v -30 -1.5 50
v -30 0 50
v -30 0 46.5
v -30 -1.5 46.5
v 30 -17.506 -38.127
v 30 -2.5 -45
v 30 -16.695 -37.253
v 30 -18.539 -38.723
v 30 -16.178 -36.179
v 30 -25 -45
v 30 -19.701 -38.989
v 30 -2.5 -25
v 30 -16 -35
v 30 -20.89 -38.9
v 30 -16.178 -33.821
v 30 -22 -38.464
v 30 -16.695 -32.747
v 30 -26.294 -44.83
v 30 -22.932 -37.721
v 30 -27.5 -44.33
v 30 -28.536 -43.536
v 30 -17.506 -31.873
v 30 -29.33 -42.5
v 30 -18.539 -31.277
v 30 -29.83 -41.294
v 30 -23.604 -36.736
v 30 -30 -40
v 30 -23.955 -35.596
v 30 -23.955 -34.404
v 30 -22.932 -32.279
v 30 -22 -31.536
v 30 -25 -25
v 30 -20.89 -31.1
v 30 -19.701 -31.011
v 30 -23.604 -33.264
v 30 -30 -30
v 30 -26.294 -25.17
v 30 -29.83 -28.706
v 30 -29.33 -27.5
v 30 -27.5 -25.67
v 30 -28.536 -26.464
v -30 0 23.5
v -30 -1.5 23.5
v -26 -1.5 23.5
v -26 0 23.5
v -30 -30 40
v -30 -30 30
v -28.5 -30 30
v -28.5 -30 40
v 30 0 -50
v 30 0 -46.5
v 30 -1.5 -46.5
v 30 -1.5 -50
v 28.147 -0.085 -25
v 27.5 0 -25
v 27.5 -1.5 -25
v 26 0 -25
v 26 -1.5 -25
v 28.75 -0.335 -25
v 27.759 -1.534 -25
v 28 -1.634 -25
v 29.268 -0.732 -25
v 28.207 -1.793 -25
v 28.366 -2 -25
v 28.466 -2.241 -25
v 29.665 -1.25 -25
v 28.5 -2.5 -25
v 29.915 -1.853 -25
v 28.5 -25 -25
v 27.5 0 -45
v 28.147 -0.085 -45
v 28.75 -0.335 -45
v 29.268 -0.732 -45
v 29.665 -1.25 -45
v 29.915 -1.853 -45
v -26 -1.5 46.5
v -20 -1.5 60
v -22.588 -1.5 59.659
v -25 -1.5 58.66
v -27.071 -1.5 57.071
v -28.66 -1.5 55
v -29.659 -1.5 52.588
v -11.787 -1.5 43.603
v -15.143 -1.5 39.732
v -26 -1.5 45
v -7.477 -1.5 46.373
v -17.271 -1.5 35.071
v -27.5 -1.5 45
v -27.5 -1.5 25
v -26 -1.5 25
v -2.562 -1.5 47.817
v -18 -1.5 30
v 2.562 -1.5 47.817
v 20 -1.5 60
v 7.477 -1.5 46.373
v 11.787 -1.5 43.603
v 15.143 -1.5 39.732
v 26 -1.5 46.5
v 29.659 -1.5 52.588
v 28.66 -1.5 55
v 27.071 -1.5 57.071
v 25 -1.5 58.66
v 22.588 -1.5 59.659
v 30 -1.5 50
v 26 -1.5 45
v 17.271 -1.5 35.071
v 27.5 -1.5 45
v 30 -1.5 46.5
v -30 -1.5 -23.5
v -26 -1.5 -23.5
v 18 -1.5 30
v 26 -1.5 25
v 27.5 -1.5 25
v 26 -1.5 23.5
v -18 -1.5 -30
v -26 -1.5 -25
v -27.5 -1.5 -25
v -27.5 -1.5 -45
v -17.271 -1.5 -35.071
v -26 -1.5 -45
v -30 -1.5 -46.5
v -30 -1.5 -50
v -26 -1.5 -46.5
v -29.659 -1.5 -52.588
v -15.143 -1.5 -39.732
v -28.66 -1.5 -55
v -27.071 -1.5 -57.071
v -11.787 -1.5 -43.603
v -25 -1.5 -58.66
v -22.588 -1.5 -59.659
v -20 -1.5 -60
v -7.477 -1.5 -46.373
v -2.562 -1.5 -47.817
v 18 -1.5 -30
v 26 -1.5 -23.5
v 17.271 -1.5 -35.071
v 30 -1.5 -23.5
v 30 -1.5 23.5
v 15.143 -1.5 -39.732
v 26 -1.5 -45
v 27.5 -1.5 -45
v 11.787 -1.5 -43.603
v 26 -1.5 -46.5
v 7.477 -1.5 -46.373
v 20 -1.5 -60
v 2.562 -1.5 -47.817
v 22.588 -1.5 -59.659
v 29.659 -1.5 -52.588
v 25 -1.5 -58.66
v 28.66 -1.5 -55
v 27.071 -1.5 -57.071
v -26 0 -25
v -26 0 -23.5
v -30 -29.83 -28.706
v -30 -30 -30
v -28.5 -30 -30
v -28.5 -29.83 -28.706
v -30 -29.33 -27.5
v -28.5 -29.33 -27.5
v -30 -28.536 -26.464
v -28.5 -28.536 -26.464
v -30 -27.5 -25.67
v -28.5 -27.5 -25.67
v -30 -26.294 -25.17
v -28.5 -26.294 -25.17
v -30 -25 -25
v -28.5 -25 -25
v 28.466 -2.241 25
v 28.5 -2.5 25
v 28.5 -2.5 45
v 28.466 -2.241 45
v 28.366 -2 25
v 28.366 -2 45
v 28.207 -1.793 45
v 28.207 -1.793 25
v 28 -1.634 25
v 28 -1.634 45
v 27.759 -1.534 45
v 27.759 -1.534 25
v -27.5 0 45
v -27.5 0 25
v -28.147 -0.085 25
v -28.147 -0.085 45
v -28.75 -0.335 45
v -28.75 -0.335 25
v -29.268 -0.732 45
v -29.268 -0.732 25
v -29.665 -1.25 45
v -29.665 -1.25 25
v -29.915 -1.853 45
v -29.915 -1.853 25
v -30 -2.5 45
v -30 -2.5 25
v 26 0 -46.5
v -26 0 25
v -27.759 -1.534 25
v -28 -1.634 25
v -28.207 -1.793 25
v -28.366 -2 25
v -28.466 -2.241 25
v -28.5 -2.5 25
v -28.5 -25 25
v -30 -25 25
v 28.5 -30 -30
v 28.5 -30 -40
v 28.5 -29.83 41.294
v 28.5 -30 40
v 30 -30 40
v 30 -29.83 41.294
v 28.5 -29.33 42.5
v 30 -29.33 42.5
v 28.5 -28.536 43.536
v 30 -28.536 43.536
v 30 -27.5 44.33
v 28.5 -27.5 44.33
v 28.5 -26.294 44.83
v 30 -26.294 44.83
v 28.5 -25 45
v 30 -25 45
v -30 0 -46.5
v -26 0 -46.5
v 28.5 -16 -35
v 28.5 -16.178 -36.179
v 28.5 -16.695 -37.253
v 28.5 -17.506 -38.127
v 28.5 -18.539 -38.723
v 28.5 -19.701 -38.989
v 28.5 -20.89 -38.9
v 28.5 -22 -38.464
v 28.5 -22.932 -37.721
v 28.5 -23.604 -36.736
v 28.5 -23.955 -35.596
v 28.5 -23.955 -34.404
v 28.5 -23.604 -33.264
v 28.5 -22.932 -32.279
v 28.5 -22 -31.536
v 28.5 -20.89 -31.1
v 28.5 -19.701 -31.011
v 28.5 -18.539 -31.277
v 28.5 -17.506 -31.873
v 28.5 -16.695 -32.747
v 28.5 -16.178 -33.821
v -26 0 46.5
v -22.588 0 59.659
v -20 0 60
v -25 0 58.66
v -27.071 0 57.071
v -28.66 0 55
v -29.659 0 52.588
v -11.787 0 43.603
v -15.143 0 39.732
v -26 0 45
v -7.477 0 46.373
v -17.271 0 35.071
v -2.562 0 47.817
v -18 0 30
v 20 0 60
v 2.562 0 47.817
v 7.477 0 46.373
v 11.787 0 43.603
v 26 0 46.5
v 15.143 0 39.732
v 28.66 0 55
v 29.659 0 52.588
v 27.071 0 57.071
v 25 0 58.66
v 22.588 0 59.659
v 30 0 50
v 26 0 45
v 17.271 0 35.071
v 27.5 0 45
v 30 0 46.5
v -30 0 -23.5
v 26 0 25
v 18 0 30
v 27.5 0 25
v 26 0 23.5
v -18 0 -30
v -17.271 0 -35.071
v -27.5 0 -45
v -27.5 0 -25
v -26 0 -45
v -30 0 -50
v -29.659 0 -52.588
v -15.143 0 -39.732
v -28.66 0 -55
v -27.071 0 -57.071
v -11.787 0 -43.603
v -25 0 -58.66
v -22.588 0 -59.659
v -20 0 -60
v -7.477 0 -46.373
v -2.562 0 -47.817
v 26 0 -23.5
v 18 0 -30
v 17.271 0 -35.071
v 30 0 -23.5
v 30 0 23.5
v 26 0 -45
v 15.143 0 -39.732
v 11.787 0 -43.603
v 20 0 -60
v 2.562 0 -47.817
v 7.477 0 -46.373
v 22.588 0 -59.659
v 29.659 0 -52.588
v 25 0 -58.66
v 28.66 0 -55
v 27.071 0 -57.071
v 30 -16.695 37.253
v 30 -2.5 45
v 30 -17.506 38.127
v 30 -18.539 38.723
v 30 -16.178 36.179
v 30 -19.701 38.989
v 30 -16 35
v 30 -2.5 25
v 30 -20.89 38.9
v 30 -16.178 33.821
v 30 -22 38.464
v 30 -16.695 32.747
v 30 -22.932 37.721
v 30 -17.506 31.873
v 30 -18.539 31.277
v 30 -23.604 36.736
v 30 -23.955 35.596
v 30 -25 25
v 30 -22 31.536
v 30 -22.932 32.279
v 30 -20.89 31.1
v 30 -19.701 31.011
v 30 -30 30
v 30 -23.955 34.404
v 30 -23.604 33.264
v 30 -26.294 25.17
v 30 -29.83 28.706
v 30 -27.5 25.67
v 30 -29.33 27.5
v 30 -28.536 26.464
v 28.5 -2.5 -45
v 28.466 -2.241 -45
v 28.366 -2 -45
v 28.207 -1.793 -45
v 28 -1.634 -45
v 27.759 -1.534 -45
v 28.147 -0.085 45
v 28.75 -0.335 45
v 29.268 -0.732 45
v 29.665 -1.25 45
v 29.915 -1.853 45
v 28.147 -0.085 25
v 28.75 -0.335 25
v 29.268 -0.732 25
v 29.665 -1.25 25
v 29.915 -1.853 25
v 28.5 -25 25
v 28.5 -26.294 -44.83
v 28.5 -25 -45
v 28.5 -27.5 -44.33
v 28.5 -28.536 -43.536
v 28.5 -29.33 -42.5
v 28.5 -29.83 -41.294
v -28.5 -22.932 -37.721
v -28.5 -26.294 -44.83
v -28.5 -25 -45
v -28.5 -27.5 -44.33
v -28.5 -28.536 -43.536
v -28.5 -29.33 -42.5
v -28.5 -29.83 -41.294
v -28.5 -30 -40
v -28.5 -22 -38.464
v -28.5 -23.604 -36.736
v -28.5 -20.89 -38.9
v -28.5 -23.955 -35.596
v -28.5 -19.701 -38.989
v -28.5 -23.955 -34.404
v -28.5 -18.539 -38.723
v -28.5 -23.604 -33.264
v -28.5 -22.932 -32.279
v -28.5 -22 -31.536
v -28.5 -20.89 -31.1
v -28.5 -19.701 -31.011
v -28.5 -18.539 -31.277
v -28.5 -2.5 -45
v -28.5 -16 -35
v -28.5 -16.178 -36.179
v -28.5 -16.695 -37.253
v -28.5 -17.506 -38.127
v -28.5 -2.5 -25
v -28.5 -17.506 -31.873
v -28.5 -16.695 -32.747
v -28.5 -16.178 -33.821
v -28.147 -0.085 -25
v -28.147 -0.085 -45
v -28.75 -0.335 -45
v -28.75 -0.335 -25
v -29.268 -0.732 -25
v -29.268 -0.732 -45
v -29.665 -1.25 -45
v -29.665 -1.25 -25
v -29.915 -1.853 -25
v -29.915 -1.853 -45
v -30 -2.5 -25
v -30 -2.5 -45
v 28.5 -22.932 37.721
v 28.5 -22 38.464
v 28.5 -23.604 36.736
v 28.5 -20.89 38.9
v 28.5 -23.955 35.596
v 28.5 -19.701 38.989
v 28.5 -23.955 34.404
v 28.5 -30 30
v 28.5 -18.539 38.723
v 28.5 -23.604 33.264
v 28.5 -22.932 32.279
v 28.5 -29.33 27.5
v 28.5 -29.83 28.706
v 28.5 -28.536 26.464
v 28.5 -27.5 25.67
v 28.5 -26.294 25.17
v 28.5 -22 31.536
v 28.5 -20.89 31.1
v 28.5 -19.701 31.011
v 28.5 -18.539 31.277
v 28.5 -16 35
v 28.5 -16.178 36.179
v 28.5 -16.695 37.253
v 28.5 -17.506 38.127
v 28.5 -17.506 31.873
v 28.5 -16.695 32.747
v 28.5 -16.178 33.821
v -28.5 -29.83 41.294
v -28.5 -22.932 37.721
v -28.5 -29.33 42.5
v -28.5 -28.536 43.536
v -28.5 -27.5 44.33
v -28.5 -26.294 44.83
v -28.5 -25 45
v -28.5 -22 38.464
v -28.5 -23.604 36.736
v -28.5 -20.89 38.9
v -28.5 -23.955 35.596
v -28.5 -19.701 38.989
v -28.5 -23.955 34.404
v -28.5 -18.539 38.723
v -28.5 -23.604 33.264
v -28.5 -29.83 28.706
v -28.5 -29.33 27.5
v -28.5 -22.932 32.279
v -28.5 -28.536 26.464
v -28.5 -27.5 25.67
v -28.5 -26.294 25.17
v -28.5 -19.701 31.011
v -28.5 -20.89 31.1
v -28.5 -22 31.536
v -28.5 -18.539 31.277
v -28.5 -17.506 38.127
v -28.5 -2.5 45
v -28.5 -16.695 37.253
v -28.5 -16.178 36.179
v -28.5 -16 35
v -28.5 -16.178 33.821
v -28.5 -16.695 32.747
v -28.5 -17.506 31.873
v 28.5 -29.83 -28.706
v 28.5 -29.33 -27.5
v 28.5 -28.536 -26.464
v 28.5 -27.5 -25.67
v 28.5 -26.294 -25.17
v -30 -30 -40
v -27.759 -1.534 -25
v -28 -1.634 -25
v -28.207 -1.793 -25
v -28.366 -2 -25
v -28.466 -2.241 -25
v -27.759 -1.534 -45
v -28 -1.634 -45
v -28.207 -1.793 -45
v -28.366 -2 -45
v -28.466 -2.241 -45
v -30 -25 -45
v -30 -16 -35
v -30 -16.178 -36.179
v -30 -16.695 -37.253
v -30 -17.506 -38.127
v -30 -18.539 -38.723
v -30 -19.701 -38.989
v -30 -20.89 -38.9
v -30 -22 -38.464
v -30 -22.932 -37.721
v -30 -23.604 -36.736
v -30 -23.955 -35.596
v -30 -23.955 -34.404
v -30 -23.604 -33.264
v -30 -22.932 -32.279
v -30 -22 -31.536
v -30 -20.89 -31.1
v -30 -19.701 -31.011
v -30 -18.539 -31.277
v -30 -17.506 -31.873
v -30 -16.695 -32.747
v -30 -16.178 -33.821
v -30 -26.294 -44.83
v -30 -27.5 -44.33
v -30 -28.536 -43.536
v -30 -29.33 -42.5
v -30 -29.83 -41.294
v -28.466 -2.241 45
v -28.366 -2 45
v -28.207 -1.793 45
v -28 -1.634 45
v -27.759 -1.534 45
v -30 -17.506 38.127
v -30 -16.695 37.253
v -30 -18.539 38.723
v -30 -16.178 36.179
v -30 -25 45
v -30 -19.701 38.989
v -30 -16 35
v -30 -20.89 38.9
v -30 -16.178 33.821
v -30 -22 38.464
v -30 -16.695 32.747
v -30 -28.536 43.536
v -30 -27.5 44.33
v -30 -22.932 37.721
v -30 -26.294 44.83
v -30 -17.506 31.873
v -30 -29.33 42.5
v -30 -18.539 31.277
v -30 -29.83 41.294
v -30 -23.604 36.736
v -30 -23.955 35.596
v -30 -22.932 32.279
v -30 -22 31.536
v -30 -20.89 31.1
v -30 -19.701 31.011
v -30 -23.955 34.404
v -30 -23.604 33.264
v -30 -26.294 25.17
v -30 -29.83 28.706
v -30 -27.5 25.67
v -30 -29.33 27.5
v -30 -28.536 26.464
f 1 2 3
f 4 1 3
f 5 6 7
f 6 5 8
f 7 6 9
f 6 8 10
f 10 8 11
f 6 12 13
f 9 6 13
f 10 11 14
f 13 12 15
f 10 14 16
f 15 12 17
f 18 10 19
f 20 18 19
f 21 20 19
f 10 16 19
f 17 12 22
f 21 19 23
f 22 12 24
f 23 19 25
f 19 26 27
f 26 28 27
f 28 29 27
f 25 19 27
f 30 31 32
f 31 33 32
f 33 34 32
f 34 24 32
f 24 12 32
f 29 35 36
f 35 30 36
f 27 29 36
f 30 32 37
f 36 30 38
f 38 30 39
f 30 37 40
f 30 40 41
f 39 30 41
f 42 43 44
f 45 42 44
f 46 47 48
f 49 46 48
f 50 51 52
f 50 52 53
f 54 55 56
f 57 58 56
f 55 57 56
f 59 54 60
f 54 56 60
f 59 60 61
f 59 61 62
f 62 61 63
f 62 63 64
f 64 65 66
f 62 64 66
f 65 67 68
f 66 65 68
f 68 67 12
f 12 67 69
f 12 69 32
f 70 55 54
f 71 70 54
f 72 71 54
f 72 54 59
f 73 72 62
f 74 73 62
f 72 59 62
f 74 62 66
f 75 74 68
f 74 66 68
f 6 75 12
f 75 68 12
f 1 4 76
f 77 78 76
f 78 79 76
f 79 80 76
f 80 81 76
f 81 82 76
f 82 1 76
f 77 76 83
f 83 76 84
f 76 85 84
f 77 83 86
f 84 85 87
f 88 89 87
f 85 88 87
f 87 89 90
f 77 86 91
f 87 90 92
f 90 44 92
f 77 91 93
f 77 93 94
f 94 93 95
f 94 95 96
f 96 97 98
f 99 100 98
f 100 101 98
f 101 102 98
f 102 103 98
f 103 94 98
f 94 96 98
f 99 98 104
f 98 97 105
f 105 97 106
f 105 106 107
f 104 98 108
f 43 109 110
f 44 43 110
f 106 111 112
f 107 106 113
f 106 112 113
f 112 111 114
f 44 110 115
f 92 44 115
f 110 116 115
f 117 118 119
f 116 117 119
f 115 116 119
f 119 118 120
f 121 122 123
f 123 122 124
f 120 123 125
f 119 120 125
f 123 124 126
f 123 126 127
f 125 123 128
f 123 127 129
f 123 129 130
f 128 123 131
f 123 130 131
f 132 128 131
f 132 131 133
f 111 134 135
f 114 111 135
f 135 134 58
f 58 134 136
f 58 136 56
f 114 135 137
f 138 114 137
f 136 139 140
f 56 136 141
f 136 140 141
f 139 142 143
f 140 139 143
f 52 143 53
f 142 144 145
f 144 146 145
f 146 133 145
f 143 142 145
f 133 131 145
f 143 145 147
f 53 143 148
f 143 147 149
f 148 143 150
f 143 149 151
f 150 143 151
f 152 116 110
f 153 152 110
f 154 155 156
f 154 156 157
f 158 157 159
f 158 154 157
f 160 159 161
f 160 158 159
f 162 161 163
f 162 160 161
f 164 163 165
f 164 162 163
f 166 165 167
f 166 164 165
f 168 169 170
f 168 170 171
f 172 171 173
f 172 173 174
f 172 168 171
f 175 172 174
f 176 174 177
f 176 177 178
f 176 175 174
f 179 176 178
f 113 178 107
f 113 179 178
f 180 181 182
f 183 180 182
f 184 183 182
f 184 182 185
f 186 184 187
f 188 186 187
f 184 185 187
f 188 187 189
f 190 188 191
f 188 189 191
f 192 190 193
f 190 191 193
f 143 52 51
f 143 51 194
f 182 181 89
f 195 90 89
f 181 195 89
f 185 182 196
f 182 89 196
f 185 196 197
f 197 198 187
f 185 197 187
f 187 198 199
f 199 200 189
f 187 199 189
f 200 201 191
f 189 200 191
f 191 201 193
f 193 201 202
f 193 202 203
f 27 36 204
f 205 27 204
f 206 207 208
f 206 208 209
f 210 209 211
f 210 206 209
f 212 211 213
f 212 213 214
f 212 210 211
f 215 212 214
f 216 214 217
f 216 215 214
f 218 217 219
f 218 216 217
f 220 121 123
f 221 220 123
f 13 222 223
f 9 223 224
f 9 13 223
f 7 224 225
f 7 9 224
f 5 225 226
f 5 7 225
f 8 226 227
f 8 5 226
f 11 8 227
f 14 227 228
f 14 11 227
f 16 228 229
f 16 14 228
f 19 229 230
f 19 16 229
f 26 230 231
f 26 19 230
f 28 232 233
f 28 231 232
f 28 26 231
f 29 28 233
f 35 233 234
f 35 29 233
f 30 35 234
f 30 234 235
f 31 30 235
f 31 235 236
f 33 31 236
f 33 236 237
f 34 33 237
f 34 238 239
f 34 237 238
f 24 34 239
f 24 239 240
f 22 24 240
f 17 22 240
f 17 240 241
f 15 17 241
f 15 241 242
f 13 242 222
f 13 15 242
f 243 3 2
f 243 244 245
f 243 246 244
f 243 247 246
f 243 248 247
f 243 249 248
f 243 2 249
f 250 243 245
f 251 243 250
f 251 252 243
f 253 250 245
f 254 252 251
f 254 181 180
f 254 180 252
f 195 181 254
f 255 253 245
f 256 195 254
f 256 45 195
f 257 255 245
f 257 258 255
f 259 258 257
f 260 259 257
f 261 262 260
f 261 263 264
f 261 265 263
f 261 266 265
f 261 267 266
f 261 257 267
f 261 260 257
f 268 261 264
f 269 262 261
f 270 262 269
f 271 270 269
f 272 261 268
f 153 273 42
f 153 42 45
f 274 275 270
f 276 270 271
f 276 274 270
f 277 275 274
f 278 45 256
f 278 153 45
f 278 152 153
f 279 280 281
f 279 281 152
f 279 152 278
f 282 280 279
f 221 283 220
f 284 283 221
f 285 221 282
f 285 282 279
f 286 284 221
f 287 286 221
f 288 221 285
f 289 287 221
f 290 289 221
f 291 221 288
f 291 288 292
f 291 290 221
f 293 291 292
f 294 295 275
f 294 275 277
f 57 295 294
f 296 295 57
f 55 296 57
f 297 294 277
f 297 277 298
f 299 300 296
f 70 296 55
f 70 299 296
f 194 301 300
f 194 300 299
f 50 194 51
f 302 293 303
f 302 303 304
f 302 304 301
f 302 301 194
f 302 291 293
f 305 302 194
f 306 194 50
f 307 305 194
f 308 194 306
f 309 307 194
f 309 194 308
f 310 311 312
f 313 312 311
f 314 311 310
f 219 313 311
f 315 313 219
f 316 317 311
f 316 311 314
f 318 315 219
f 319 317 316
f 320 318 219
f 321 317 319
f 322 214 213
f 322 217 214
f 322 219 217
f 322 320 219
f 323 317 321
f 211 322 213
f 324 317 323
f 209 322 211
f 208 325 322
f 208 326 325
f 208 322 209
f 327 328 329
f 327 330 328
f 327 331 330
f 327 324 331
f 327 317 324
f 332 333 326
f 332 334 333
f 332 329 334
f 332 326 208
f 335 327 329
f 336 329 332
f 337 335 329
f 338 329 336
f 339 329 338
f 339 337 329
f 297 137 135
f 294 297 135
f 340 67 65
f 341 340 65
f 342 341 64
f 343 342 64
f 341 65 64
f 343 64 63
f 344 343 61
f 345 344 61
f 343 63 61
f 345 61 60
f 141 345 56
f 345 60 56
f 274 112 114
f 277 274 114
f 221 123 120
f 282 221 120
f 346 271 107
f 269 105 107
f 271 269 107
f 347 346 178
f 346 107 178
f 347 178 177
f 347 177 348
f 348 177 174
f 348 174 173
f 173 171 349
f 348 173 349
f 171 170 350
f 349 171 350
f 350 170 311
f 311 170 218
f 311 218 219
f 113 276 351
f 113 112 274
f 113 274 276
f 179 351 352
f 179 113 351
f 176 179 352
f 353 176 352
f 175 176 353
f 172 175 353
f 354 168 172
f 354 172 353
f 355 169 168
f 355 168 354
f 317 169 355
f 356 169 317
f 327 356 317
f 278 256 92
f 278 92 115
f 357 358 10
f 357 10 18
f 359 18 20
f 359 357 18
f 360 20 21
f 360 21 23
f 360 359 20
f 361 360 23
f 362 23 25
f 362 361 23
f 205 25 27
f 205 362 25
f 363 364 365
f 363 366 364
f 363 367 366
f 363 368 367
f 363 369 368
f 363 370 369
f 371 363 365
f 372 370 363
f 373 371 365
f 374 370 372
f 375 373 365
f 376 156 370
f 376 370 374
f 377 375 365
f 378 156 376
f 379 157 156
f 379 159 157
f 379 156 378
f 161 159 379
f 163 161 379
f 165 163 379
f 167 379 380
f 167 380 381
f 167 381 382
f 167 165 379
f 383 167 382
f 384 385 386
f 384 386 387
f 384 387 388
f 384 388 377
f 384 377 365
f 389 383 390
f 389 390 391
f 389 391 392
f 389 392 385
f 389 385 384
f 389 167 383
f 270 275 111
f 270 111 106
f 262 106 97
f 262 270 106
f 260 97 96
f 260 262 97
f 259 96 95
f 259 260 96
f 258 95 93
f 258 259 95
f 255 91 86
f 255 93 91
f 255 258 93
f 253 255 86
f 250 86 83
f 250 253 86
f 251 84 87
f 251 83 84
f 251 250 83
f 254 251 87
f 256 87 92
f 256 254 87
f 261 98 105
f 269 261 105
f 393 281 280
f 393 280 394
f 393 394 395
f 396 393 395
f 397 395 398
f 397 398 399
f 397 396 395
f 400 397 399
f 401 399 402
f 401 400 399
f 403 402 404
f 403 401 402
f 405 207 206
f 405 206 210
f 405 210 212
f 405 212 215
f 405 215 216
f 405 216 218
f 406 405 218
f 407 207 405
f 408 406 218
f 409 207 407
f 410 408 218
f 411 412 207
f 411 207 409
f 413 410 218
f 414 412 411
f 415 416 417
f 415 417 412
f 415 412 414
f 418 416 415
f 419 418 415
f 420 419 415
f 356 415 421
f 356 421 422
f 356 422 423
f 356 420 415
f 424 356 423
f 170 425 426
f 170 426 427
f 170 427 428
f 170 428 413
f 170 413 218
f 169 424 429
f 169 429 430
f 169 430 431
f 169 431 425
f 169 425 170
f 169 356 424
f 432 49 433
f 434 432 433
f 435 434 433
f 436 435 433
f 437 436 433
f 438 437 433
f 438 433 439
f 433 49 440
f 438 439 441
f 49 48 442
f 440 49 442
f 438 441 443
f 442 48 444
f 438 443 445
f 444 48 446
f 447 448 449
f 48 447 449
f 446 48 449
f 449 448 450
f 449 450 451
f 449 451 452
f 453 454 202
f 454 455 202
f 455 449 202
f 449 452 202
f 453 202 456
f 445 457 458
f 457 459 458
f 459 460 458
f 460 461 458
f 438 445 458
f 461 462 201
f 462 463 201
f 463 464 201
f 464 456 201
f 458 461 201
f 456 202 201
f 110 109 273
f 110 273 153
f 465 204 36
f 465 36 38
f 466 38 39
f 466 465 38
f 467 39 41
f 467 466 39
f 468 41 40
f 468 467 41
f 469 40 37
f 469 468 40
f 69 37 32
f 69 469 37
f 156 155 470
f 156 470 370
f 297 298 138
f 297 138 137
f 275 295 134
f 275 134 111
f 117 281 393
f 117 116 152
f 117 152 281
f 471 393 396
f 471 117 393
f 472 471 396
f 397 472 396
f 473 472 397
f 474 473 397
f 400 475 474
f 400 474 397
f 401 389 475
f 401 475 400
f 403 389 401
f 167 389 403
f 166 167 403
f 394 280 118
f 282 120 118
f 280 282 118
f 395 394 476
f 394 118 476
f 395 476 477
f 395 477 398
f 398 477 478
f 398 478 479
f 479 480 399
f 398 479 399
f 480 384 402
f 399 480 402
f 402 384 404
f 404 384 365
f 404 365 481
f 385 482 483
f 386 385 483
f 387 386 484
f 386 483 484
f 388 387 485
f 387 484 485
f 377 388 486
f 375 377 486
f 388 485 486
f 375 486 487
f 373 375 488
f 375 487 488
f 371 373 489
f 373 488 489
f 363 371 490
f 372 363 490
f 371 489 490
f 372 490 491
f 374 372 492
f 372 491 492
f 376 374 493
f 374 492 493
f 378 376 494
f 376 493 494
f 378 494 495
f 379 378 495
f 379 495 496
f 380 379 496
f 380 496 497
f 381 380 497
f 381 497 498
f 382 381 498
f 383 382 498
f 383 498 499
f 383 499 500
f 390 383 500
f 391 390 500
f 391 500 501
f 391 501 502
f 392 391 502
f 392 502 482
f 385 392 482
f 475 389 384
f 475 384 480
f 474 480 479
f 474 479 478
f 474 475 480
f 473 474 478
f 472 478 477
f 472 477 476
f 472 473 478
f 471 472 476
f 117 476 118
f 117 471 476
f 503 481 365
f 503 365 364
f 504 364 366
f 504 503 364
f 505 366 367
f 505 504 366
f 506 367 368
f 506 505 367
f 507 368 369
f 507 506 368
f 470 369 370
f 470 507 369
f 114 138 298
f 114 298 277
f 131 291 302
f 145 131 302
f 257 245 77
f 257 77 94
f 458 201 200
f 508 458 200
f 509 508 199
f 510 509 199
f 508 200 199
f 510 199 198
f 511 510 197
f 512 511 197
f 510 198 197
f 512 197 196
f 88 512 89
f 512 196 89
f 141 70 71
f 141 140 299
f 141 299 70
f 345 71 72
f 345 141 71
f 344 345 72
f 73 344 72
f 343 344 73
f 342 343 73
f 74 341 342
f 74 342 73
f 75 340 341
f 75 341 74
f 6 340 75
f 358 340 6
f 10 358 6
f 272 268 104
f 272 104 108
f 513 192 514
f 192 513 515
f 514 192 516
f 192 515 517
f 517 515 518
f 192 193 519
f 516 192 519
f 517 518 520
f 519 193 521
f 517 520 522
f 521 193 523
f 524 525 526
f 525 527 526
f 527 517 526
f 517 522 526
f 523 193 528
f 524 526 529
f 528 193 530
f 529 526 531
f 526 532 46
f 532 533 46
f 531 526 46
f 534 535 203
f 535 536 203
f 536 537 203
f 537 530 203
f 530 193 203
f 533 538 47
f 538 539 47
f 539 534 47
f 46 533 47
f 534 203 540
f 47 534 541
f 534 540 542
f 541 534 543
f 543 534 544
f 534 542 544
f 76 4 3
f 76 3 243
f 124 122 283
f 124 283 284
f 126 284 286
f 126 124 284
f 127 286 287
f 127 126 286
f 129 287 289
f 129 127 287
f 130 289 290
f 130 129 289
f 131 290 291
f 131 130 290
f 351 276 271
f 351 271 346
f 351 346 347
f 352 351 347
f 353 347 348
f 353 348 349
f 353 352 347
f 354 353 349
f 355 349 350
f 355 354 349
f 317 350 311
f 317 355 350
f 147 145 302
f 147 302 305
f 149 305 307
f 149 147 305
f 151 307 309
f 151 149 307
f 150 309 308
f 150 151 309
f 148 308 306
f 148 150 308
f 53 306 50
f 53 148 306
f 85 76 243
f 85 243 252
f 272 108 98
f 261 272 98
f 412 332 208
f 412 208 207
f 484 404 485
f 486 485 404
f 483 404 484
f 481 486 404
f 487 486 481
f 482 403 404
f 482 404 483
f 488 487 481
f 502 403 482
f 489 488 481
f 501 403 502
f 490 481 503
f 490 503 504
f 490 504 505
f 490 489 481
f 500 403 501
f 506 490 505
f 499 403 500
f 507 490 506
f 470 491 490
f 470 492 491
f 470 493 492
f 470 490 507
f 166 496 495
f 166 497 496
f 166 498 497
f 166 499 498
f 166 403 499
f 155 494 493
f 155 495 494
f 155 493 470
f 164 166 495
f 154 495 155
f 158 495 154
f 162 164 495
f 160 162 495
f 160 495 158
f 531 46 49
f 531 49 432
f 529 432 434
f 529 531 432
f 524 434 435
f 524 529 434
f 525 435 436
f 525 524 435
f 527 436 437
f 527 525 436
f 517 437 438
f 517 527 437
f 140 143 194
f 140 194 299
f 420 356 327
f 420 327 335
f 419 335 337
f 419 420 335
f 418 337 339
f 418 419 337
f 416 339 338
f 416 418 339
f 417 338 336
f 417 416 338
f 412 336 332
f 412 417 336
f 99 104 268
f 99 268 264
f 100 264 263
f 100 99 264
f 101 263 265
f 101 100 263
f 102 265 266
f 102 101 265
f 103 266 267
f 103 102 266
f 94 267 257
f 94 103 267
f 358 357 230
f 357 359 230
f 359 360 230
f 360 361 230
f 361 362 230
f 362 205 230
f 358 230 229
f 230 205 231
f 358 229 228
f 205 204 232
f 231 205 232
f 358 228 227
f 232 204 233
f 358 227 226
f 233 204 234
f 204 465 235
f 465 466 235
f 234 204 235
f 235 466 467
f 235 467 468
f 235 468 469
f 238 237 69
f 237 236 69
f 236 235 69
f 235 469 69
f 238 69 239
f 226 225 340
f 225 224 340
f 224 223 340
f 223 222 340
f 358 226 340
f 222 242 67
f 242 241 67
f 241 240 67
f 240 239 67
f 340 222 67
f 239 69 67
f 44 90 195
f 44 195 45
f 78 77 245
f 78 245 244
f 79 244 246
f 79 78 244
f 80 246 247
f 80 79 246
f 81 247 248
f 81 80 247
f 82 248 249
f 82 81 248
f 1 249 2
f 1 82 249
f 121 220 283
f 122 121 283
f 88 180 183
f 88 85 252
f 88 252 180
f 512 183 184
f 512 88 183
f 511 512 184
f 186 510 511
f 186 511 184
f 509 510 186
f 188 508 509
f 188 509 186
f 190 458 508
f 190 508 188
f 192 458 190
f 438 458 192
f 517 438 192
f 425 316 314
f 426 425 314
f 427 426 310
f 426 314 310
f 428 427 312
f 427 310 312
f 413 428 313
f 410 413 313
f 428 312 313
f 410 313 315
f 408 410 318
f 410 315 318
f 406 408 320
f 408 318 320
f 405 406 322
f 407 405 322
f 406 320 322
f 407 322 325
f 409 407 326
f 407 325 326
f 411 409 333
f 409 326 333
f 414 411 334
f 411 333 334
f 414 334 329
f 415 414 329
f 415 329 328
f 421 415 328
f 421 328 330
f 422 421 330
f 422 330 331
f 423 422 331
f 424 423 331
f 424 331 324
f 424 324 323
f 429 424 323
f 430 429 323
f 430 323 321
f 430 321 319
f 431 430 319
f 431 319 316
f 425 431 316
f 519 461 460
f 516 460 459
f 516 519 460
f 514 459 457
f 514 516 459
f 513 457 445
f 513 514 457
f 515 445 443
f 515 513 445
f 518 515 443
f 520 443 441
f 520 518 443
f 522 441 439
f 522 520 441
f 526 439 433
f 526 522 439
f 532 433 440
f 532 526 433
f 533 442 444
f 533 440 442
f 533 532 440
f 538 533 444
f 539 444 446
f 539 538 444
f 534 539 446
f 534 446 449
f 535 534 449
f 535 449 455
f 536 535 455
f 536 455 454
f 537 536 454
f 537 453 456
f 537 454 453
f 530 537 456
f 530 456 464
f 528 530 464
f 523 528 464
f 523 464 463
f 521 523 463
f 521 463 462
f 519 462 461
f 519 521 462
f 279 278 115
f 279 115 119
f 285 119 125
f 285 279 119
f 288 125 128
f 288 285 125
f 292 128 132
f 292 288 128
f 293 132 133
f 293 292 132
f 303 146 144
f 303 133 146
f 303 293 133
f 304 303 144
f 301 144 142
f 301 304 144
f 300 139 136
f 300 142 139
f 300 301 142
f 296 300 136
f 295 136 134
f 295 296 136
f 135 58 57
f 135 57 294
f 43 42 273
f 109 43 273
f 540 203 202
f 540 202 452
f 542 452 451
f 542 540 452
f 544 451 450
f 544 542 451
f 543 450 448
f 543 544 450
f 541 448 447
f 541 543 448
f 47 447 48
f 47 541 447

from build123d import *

# Parameters (mm, degrees)
SKETCH1_W                     = 60
SKETCH1_H                     = 120
BASE_FLANGE1_DEPTH            = 1.5
CUT_EXTRUDE1_DEPTH            = 10
BREAK_CORNER1_START           = -1.5
BREAK_CORNER1_DEPTH           = 1.5
EDGE_FLANGE1_STRIP_W          = 8
EDGE_FLANGE1_STRIP_H          = 1.5
EDGE_FLANGE1_STRIP_CUT_DEPTH  = 20
EDGE_FLANGE1_RELIEF_W         = 9.5
EDGE_FLANGE1_RELIEF_H         = 1.5
EDGE_FLANGE1_RELIEF_CUT_DEPTH = 1.5
EDGE_FLANGE1_DEPTH            = 20
SKETCH10_R                    = 4
CUT_EXTRUDE2_DEPTH            = 10
MIRROR2_COPY_1_SKETCH_W       = 8
MIRROR2_COPY_1_SKETCH_H       = 1.5
MIRROR2_COPY_1_DEPTH          = 20
MIRROR2_COPY_2_SKETCH_W       = 9.5
MIRROR2_COPY_2_SKETCH_H       = 1.5
MIRROR2_COPY_2_DEPTH          = 1.5
MIRROR2_COPY_3_DEPTH          = 20
MIRROR2_COPY_4_SKETCH_R       = 4
MIRROR2_COPY_4_DEPTH          = 10
BREAK_CORNER2_START           = -30
BREAK_CORNER2_DEPTH           = 60


# Read off the part's stored shape, not the designer's step: Break-Corner1, Break-Corner2
# Sheet-metal steps are written as plain solids
with BuildPart() as part:
    # Sketch1 → Base-Flange1 (new body)
    with BuildSketch(Plane(origin=(0, 0, 0), x_dir=(1, 0, 0), z_dir=(0, 1, 0))):
        Rectangle(SKETCH1_W, SKETCH1_H)
    extrude(amount=-BASE_FLANGE1_DEPTH)

    # Sketch6 → Cut-Extrude1 (cut)
    with BuildSketch(Plane(origin=(0, 0, 0), x_dir=(1, 0, 0), z_dir=(0, 1, 0))):
        with BuildLine():
            Line((18, 30), (18, -30))
            ThreePointArc((18, -30), (0, -48), (-18, -30))
            Line((-18, -30), (-18, 30))
            ThreePointArc((-18, 30), (0, 48), (18, 30))
        make_face()
    extrude(amount=-CUT_EXTRUDE1_DEPTH, mode=Mode.SUBTRACT)

    # Break-Corner1 outline → Break-Corner1 (cut)
    with BuildSketch(Plane(origin=(0, 0, 0), x_dir=(1, 0, 0), z_dir=(0, 1, 0)).offset(BREAK_CORNER1_START)):
        with BuildLine():
            ThreePointArc((30, -50), (27.071067812, -57.071067812), (20, -60))
            Line((20, -60), (30, -60))
            Line((30, -60), (30, -50))
        make_face()
        with BuildLine():
            Line((-30, -60), (-20, -60))
            ThreePointArc((-20, -60), (-27.071067812, -57.071067812), (-30, -50))
            Line((-30, -50), (-30, -60))
        make_face()
        with BuildLine():
            ThreePointArc((20, 60), (27.071067812, 57.071067812), (30, 50))
            Line((30, 50), (30, 60))
            Line((30, 60), (20, 60))
        make_face()
        with BuildLine():
            Line((-30, 60), (-30, 50))
            ThreePointArc((-30, 50), (-27.071067812, 57.071067812), (-20, 60))
            Line((-20, 60), (-30, 60))
        make_face()
    extrude(amount=BREAK_CORNER1_DEPTH, mode=Mode.SUBTRACT)

    # Edge-Flange1 strip (across the edge) → Edge-Flange1 strip cut (cut)
    with BuildSketch(Plane(origin=(30, -1.5, 25), x_dir=(-1, 0, 0), z_dir=(0, 0, 1))):
        with Locations((-1.5, -0.75)):
            Rectangle(EDGE_FLANGE1_STRIP_W, EDGE_FLANGE1_STRIP_H)
    edge_flange1_strip_cut = extrude(amount=EDGE_FLANGE1_STRIP_CUT_DEPTH, mode=Mode.SUBTRACT)

    # Edge-Flange1 relief (on the sheet) → Edge-Flange1 relief cut (cut)
    with BuildSketch(Plane(origin=(27.5, -1.5, 25), x_dir=(-1, 0, 0), z_dir=(0, -1, 0))):
        with Locations((-3.25, 0.75)):
            Rectangle(EDGE_FLANGE1_RELIEF_W, EDGE_FLANGE1_RELIEF_H)
        with Locations((-3.25, -20.75)):
            Rectangle(EDGE_FLANGE1_RELIEF_W, EDGE_FLANGE1_RELIEF_H)
    edge_flange1_relief_cut = extrude(amount=-EDGE_FLANGE1_RELIEF_CUT_DEPTH, mode=Mode.SUBTRACT)

    # Edge-Flange1 section (across the edge) → Edge-Flange1 (add)
    with BuildSketch(Plane(origin=(30, -1.5, 25), x_dir=(-1, 0, 0), z_dir=(0, 0, 1))):
        with BuildLine():
            Line((0, 1), (0, 28.5))
            Line((0, 28.5), (1.5, 28.5))
            Line((1.5, 28.5), (1.5, 1))
            ThreePointArc((1.5, 1), (1.792893219, 0.292893219), (2.5, 0))
            Line((2.5, 0), (2.5, -1.5))
            ThreePointArc((2.5, -1.5), (0.732233047, -0.767766953), (0, 1))
        make_face()
    edge_flange1 = extrude(amount=EDGE_FLANGE1_DEPTH)

    # Sketch10 → Cut-Extrude2 (cut)
    with BuildSketch(Plane(origin=(30, 0, 0), x_dir=(0, 0, -1), z_dir=(1, 0, 0))):
        with Locations(Location((-35, -20, 0), (0, 0, 90))):
            Circle(SKETCH10_R)
    cut_extrude2 = extrude(amount=-CUT_EXTRUDE2_DEPTH, mode=Mode.SUBTRACT)

    # Mirror1: Edge-Flange1 strip cut, Edge-Flange1 relief cut, Edge-Flange1, Cut-Extrude2 across plane
    add(edge_flange1_strip_cut.mirror(Plane.XY), mode=Mode.SUBTRACT)
    add(edge_flange1_relief_cut.mirror(Plane.XY), mode=Mode.SUBTRACT)
    add(edge_flange1.mirror(Plane.XY))
    add(cut_extrude2.mirror(Plane.XY), mode=Mode.SUBTRACT)

    # Mirror2: Edge-Flange1 strip cut, Edge-Flange1 relief cut, Edge-Flange1, Cut-Extrude2 across plane
    add(edge_flange1_strip_cut.mirror(Plane(origin=(0, 0, 0), x_dir=(0, 0, 1), z_dir=(1, 0, 0))), mode=Mode.SUBTRACT)
    add(edge_flange1_relief_cut.mirror(Plane(origin=(0, 0, 0), x_dir=(0, 0, 1), z_dir=(1, 0, 0))), mode=Mode.SUBTRACT)
    add(edge_flange1.mirror(Plane(origin=(0, 0, 0), x_dir=(0, 0, 1), z_dir=(1, 0, 0))))
    add(cut_extrude2.mirror(Plane(origin=(0, 0, 0), x_dir=(0, 0, 1), z_dir=(1, 0, 0))), mode=Mode.SUBTRACT)

    # Mirror2 copy 1 sketch → Mirror2 copy 1 (cut)
    with BuildSketch(Plane(origin=(-30, -1.5, -25), x_dir=(1, 0, 0), z_dir=(0, 0, -1))):
        with Locations((-1.5, -0.75)):
            Rectangle(MIRROR2_COPY_1_SKETCH_W, MIRROR2_COPY_1_SKETCH_H)
    extrude(amount=MIRROR2_COPY_1_DEPTH, mode=Mode.SUBTRACT)

    # Mirror2 copy 2 sketch → Mirror2 copy 2 (cut)
    with BuildSketch(Plane(origin=(-27.5, -1.5, -25), x_dir=(1, 0, 0), z_dir=(0, -1, 0))):
        with Locations((-3.25, 0.75)):
            Rectangle(MIRROR2_COPY_2_SKETCH_W, MIRROR2_COPY_2_SKETCH_H)
        with Locations((-3.25, -20.75)):
            Rectangle(MIRROR2_COPY_2_SKETCH_W, MIRROR2_COPY_2_SKETCH_H)
    extrude(amount=-MIRROR2_COPY_2_DEPTH, mode=Mode.SUBTRACT)

    # Mirror2 copy 3 sketch → Mirror2 copy 3 (add)
    with BuildSketch(Plane(origin=(-30, -1.5, -25), x_dir=(1, 0, 0), z_dir=(0, 0, -1))):
        with BuildLine():
            Line((0, 1), (0, 28.5))
            Line((0, 28.5), (1.5, 28.5))
            Line((1.5, 28.5), (1.5, 1))
            ThreePointArc((1.5, 1), (1.792893219, 0.292893219), (2.5, 0))
            Line((2.5, 0), (2.5, -1.5))
            ThreePointArc((2.5, -1.5), (0.732233047, -0.767766953), (0, 1))
        make_face()
    extrude(amount=MIRROR2_COPY_3_DEPTH)

    # Mirror2 copy 4 sketch → Mirror2 copy 4 (cut)
    with BuildSketch(Plane.ZY.offset(30)):
        with Locations(Location((-35, -20, 0), (0, 0, 90))):
            Circle(MIRROR2_COPY_4_SKETCH_R)
    extrude(amount=-MIRROR2_COPY_4_DEPTH, mode=Mode.SUBTRACT)

    # Break-Corner2 outline → Break-Corner2 (cut)
    with BuildSketch(Plane.YZ.offset(BREAK_CORNER2_START)):
        with BuildLine():
            Line((-30, 45), (-30, 40))
            ThreePointArc((-30, 40), (-28.535533906, 43.535533906), (-25, 45))
            Line((-25, 45), (-30, 45))
        make_face()
        with BuildLine():
            ThreePointArc((-25, 25), (-28.535533906, 26.464466094), (-30, 30))
            Line((-30, 30), (-30, 25))
            Line((-30, 25), (-25, 25))
        make_face()
        with BuildLine():
            ThreePointArc((-25, -45), (-28.535533906, -43.535533906), (-30, -40))
            Line((-30, -40), (-30, -45))
            Line((-30, -45), (-25, -45))
        make_face()
        with BuildLine():
            Line((-30, -25), (-30, -30))
            ThreePointArc((-30, -30), (-28.535533906, -26.464466094), (-25, -25))
            Line((-25, -25), (-30, -25))
        make_face()
    extrude(amount=BREAK_CORNER2_DEPTH, mode=Mode.SUBTRACT)


solid = part.part
